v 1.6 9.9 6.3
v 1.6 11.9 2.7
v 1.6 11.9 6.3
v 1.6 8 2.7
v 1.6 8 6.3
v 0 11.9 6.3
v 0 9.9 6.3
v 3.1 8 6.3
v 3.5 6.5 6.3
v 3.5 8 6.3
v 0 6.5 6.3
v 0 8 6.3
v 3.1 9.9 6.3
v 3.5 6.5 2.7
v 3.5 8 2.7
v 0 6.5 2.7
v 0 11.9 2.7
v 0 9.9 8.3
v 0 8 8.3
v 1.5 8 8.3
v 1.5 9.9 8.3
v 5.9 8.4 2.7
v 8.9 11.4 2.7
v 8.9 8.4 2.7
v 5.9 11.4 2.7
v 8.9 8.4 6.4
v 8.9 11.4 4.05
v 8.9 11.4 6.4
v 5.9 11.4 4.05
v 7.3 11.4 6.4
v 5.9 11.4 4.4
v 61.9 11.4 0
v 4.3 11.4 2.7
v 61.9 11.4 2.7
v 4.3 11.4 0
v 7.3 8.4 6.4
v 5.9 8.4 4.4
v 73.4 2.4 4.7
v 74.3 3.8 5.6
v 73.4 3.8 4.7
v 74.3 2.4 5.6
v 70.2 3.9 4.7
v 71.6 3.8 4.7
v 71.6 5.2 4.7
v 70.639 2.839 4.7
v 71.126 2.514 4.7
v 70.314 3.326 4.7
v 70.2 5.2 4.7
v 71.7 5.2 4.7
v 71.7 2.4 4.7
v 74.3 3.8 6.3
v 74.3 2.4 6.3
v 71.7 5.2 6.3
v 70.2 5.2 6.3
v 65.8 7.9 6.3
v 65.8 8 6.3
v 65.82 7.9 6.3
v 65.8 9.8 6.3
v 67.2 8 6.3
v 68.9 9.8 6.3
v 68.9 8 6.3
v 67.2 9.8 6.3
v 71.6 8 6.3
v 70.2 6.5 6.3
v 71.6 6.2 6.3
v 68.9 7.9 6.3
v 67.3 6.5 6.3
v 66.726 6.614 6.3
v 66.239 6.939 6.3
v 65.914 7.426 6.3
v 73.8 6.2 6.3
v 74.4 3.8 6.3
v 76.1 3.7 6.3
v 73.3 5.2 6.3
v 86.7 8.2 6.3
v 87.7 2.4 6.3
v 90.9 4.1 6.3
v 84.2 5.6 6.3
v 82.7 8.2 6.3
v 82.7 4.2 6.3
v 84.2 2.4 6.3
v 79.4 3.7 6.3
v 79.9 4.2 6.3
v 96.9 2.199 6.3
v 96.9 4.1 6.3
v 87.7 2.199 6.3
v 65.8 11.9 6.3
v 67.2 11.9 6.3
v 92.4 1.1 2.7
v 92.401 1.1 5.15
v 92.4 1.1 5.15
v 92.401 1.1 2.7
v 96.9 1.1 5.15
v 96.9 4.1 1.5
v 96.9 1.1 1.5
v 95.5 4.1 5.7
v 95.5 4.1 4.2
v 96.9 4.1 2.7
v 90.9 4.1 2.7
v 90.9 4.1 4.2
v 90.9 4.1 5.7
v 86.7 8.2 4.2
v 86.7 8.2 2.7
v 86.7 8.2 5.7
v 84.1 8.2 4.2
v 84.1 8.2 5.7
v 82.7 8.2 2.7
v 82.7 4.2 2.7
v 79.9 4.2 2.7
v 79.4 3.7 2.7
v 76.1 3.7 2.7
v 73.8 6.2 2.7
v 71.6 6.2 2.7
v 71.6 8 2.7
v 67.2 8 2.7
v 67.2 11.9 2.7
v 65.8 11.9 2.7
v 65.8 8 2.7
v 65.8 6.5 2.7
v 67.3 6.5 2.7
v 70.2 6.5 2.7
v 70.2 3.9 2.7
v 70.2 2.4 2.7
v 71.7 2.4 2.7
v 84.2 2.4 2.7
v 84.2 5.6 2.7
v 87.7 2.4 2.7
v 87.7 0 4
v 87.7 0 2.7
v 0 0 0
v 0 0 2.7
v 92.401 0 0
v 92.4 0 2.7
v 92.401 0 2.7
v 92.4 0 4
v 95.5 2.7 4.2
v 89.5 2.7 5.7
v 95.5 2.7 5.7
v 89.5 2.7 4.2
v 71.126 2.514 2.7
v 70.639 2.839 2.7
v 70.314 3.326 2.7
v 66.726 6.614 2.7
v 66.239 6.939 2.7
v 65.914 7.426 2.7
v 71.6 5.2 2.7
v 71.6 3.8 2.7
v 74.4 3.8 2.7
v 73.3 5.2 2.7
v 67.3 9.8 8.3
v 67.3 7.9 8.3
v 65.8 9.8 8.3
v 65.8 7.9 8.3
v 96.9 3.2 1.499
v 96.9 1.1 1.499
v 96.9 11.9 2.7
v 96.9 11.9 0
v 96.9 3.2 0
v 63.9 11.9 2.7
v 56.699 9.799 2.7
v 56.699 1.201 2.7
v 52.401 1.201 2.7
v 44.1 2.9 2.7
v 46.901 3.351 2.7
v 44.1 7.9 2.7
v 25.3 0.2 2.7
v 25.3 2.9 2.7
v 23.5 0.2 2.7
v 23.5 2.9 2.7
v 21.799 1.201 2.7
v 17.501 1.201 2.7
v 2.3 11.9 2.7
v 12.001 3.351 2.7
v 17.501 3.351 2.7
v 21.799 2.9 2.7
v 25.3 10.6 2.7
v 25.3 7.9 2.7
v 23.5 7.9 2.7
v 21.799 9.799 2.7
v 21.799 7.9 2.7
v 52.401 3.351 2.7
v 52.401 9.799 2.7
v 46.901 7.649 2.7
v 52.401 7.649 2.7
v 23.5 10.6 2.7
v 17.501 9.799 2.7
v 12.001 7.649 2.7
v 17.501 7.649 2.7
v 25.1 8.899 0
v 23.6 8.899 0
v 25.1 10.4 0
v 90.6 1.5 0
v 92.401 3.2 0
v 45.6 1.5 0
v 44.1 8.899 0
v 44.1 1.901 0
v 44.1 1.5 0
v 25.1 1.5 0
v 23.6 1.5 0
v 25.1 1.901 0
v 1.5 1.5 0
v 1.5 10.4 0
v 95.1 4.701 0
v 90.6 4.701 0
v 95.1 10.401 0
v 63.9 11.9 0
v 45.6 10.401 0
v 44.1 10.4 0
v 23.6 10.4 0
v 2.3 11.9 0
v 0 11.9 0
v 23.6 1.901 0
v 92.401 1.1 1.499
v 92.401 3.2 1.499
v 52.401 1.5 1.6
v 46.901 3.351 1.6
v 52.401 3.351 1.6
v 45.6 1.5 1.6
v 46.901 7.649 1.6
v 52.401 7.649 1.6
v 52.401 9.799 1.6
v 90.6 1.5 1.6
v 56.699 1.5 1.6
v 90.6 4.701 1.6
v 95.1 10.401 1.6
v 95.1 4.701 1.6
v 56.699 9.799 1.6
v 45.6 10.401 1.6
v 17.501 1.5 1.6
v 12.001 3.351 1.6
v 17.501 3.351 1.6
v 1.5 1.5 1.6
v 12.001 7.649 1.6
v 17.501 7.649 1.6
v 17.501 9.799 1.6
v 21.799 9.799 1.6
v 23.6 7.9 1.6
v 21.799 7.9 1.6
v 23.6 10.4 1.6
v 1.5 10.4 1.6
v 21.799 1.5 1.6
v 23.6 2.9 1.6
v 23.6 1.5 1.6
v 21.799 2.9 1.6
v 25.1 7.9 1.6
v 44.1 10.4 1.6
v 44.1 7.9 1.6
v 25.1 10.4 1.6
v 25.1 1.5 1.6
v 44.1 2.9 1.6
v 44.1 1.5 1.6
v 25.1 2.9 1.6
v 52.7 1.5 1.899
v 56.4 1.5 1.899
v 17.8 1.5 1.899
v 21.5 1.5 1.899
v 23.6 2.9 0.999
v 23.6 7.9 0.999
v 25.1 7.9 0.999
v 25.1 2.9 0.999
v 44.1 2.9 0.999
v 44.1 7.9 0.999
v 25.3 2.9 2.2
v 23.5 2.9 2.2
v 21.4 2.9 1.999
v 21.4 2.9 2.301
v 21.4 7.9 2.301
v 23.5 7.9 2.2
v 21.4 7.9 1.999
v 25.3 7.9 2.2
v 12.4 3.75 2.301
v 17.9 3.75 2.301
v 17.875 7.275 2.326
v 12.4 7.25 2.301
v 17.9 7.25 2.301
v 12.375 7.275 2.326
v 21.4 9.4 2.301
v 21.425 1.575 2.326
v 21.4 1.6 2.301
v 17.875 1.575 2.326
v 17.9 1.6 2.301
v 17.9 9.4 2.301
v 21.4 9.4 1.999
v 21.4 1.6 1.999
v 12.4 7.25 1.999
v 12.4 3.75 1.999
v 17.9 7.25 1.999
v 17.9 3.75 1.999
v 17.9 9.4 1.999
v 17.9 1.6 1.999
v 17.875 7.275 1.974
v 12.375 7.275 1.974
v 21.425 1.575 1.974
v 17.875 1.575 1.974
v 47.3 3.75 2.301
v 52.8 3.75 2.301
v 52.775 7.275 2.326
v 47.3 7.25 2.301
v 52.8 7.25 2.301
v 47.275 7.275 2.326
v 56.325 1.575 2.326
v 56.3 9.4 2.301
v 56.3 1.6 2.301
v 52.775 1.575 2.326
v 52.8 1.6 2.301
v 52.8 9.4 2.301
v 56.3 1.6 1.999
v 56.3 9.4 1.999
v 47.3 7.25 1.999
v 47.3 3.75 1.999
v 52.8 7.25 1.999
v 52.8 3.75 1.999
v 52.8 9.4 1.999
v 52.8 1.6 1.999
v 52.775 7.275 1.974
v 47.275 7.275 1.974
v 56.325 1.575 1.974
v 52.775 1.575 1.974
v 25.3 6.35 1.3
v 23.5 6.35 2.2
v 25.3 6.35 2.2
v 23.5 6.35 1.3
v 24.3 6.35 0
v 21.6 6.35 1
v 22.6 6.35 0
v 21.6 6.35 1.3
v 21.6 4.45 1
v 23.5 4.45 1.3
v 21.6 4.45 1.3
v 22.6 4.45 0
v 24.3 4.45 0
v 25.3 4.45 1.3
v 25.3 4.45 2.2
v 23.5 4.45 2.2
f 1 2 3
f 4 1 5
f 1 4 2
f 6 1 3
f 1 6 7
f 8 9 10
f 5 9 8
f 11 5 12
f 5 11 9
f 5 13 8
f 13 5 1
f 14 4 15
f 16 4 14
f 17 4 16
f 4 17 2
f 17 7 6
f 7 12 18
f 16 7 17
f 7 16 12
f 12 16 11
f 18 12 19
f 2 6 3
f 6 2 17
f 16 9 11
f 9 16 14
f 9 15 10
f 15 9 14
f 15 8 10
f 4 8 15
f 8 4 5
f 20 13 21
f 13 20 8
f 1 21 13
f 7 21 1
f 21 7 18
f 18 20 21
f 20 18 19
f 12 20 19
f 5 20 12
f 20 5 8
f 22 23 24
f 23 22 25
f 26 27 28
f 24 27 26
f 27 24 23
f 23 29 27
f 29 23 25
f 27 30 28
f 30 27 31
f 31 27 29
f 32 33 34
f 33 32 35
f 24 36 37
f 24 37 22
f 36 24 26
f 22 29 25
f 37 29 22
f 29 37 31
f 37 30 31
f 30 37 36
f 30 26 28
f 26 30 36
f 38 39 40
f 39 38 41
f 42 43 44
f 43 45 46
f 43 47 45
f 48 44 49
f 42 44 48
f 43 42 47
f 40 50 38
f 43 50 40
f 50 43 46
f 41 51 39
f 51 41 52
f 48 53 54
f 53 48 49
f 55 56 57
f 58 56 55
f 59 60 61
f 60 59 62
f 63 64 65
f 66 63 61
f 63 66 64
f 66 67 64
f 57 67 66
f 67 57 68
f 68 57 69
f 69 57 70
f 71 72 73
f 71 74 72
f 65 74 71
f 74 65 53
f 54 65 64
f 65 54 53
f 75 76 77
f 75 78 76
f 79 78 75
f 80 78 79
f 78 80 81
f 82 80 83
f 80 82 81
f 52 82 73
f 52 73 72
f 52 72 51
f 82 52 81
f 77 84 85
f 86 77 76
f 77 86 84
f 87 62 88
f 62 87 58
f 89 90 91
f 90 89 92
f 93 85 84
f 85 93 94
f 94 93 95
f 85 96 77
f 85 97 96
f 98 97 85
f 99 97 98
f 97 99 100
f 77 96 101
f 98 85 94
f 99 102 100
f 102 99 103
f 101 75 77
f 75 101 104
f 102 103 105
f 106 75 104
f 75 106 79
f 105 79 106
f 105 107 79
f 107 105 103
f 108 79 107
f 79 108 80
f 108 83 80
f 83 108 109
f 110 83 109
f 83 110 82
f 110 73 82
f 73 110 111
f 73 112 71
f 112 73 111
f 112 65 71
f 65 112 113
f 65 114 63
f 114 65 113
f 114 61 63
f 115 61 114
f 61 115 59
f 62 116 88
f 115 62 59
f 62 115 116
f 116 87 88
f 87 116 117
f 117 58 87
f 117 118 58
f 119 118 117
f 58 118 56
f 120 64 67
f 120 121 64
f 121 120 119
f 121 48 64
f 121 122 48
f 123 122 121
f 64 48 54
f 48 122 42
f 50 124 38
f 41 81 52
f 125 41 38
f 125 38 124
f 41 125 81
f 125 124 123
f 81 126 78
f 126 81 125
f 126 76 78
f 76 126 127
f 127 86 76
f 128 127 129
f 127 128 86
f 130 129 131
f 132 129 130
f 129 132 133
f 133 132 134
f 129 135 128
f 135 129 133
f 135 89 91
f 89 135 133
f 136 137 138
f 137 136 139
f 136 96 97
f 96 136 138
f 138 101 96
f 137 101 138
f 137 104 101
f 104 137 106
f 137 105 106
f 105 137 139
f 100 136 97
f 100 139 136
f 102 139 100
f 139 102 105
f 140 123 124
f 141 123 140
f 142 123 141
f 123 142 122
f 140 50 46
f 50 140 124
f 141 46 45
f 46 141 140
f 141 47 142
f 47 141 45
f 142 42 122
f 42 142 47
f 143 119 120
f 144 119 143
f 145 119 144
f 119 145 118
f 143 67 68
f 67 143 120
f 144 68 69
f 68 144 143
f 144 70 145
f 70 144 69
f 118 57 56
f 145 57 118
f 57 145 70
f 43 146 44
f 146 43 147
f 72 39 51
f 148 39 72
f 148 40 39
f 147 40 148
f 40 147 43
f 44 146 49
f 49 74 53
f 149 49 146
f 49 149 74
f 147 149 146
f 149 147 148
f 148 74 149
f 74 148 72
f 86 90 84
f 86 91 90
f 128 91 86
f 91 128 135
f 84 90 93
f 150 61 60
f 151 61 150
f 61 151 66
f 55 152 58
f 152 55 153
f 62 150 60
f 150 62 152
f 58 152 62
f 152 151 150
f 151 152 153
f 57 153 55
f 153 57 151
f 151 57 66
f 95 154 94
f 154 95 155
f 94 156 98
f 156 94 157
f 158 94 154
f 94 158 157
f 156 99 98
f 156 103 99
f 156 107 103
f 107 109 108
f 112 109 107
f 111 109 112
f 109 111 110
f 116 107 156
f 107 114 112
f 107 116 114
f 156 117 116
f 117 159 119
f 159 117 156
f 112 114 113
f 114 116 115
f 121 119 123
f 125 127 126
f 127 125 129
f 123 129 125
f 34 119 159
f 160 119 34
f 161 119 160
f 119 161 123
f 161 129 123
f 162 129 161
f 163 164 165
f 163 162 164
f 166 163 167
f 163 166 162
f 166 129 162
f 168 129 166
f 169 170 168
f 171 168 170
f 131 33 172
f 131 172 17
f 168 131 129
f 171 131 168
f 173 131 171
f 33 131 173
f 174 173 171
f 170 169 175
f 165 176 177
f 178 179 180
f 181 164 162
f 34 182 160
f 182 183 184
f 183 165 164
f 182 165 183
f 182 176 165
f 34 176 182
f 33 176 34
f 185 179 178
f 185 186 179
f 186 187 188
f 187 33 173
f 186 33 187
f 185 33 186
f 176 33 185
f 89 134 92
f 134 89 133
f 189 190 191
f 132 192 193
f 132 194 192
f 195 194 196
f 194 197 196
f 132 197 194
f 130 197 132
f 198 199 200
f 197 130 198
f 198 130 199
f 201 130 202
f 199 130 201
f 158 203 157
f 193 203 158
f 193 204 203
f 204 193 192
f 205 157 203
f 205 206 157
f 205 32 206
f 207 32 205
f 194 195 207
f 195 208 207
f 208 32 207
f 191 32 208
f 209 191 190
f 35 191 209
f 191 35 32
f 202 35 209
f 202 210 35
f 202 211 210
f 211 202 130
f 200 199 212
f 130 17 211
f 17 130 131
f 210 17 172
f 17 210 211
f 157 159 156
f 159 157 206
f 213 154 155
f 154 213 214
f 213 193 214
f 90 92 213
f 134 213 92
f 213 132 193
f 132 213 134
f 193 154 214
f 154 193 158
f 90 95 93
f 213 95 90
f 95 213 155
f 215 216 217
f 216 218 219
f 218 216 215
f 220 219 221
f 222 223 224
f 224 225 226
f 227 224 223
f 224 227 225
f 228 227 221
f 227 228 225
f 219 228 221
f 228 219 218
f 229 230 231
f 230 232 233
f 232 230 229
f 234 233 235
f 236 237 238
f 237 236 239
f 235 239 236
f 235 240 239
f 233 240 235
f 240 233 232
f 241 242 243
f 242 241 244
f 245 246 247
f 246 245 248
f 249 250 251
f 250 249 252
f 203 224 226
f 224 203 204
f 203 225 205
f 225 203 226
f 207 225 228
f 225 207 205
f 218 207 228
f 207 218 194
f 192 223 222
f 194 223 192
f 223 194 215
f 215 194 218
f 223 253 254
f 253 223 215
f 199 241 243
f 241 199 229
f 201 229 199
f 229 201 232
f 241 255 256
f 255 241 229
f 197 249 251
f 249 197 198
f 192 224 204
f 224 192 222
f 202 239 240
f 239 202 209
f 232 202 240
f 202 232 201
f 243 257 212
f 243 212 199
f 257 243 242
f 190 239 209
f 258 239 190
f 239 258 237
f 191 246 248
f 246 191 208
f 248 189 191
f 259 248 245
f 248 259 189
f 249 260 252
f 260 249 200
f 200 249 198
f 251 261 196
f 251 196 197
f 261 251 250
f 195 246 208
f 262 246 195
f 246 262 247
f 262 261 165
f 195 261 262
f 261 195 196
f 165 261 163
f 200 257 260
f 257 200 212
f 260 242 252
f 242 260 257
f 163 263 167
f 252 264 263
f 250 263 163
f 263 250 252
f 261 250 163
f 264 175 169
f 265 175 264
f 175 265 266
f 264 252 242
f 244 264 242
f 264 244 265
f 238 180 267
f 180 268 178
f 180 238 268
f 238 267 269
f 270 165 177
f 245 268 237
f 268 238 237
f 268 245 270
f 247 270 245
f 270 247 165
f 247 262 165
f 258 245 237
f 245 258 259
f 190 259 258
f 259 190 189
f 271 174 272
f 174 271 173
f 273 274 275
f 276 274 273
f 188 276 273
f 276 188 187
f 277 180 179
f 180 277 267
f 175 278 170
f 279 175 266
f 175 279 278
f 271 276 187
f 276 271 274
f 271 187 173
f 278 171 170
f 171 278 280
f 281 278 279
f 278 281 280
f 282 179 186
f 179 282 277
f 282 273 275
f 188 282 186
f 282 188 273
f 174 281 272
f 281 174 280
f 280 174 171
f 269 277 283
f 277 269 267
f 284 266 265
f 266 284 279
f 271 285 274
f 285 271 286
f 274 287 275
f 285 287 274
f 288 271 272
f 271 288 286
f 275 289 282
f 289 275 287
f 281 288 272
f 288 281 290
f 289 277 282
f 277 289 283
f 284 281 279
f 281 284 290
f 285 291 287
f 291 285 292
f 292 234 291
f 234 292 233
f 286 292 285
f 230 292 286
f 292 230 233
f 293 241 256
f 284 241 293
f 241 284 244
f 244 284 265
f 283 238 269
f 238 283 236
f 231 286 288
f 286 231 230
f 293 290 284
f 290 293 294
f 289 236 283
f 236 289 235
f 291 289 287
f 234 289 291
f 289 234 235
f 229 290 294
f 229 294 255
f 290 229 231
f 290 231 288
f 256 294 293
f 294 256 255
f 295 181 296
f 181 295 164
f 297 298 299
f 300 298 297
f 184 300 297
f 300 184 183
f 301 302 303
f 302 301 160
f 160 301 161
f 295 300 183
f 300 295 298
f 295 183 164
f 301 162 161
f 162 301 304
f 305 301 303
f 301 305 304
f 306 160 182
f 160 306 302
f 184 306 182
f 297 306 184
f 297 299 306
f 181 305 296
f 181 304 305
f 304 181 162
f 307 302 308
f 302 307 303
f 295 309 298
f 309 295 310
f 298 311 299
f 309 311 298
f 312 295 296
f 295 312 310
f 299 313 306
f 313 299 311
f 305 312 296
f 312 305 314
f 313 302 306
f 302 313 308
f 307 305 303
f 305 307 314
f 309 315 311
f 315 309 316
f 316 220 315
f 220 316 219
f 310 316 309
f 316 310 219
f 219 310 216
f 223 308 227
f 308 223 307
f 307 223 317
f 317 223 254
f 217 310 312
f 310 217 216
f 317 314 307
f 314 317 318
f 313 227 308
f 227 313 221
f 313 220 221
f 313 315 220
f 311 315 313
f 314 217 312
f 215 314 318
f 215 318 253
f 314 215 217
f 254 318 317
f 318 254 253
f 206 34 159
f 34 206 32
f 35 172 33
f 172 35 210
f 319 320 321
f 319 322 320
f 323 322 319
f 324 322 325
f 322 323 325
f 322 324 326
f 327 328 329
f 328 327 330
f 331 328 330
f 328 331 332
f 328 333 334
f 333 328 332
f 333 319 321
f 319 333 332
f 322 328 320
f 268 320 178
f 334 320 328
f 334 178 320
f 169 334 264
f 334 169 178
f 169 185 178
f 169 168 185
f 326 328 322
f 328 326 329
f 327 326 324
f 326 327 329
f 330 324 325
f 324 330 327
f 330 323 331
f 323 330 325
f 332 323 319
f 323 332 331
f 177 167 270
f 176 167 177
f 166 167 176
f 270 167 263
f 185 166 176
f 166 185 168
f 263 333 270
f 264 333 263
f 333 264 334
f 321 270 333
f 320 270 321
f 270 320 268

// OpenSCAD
$fn=16;

HACK=0.001;

body = [ 96.9, 11.9, 2.7 ];

wall = 1.5;
hollow_depth = 1.6;

end_corner_notch = [ 4.5, 3.2+HACK, 1.5];
half_end_corner_notch = [ 4.5, 1.1+HACK, 3*body[2]];
t_hole_chamfer = 0.4;

slide_cut_h = 5;
upper_notch_h = 0.5;

module chamfer_cuboid(w, h, chamfer) {
  scale = [ (w-2*chamfer)/w,
            (h-2*chamfer)/h
          ];
  
  translate([w/2, h/2])
  linear_extrude(chamfer, scale=scale) {
    square([w,h], center=true);
    
  }
}


// Origin is Bottom-right, on the top surface (hanging below the X/Y plane)
// T-shaped hole with chamfers on both openings
module t_hole(depth) {
  chamfer=t_hole_chamfer;
  w=9;
  h=7.8;
  t=3.5;
  d=depth - 2*chamfer;    // Depth of the straight portion
  
  cw = w + 2*chamfer;
  ch = h + 2*chamfer;
  ct = t + 2*chamfer;

  // Extended above the top of the upper surface
  translate([-chamfer, -chamfer, HACK]) {
    translate([0, (ch-ct)/2]) {
      //cube([cw,ct,depth+HACK]);
      mirror([0,0,1])
        chamfer_cuboid(cw,ct, chamfer);
    }
    translate([(cw-ct), 0]) {
      //cube([ct,ch,depth+HACK]);
      mirror([0,0,1])
        chamfer_cuboid(ct,ch, chamfer);
    }
  }
  
  // FIXME: Chamfer these holes
  
  // Straight bit of the hole
  translate([0, 0, -depth+HACK]) {
    translate([0, (h-t)/2])
      cube([w,t,depth]);
    translate([(w-t), 0])
      cube([t,h,depth]);
  }
  
  // Extended below the bottom surface
  translate([-chamfer, -chamfer,-depth-HACK]) {
    translate([0, (ch-ct)/2]) {
      //cube([cw,ct,depth+HACK]);
      chamfer_cuboid(cw,ct, chamfer);
    }
    translate([(cw-ct), 0]) {
      //cube([ct,ch,depth+HACK]);
      chamfer_cuboid(ct,ch, chamfer);
    }
  }

}

// The long rectangular cut, including the chamfers of the little vertical wall
// Origin is the far-bottom (+x, -y) corner of the rectangular hole
// Z-aligned with the top surface of the body
module slide_cut() {
  
  chamfer = 1;
  h = slide_cut_h;
  l = 25;
  d = body[2] + 1 - chamfer;
  
  // Extend one extra mm past top surface
  translate([0,0,1])
  rotate([90, 0, -90])
  linear_extrude(l) {
    polygon(
      [
        [ 0, 0],
        [ -h, 0],
        [ -h, -d],
        [ -(h+chamfer), -(d+chamfer) ],
        [ -(h+chamfer), -(d+3*chamfer) ],  // Extend cut below
    
        [ (chamfer), -(d+3*chamfer) ],  // Extend cut below
        [ (chamfer), -(d+chamfer) ],
        [ 0, -d],
      ]
    );
  }
}

module spring_hook() {
  chamfer = 1;
  top = 1.7;
  neck_w = 1.8;
  tip = 0.3;
  
  width = chamfer + top + chamfer;
  height = 1.9;
  depth = 2.2;
  
  bar_depth = body[2] - depth;
  
  // The little hook that hangs under the bar
  translate([0,0,-bar_depth])
  rotate([90, 0, 0])
  linear_extrude(height, center=true)
    polygon(
      [
        [ 0, HACK ],
        [ neck_w, HACK],
        [ neck_w, -(height - chamfer)],
        [ neck_w - chamfer, -depth ],
        [ neck_w - chamfer - top, -depth],
        [ neck_w - chamfer - top - chamfer, -(depth - chamfer)],
        [ neck_w - chamfer - top - chamfer, -(depth - chamfer - tip)],
        [ 0, -(depth- chamfer - tip)],
      ]
    );
    
    // The vertical bar the hook sits on
    translate([neck_w/2, 0, -bar_depth/2])
    cube([neck_w, body[1] - wall, bar_depth], center=true);
}


module latch_tip() {
  mirror([0,1,0])
  rotate([90, 0, 0])
  linear_extrude(1.9)
  polygon(
    [
      [ 0,0 ],
      [ 0, 2 ],
      [ 1.5, 2],
      [ 3.1, 0 ]
    ]
  );
}
  
module front_latch() {
  d = 3.6;
  h = 5.4;
  
  translate([0,-h, 0])
  union() {
    
    // L-shaped bit on the left
    cube([1.6, h, d]);
    cube([3.5, 1.5, d]);
    
    // Latch on top of the L-shaped bit
    translate([0, 1.5, d])
      latch_tip();
    
    // Latchy thing to the right
    translate([8.9, h - upper_notch_h, 0])
    rotate([90, 0, 0])
    linear_extrude(3) {
      polygon([
        [ -3,0 ],
        [ 0,0 ],
        [ 0, 3.7 ],
        [ -1.6, 3.7 ],
        [ -3, 1.7 ]
      ]);
    }
  }
}

module br_fillet(r) {
  translate([r, r])
  difference() {
    translate([-(r+HACK), -(r+HACK)])
      square(r+HACK, center=false);
    
    circle(r=r, center=true);
  }
}

module rear_latch() {
  d = 3.6;
  rounding = 1.5;
  extra_depth = body[2] - 1.5;
  difference() {
    translate([0,0,-extra_depth])
    linear_extrude(d+extra_depth) {
      polygon([
        // Lower (outside) edge of contour
        [ 0, 1.1 ],
        [ -end_corner_notch[0], 1.1 ],
        [ -end_corner_notch[0], 0 ],
        [ -9.2, 0 ],
        [ -9.2, 2.4 ],
        [ -12.7, 5.6 ],
        [ -12.7, 2.4 ],
        [ -26.7, 2.4 ],   // Rounded
        [ -26.7, 6.5 ],
        [ -31.1, 6.5 ],     // Rounded
        [ -31.1, body[1] ], // Top-left corner
      
        // Inside edge (upper)
        [ -29.7, body[1] ],
        [ -29.7, body[1] - 3.9 ],
        [ -25.3, body[1] - 3.9 ],
        [ -25.3, body[1] - 5.7 ],
        [ -(25.3-2.2), body[1] - 5.7 ],
        [ -20.8, body[1] - 8.2 ],
        [ -17.5, body[1] - 8.2 ],
        [ -17, body[1] - 7.7 ],
        [ -14.2, body[1] - 7.7 ],
        [ -14.2, body[1] - 3.7 ],
        [ -10.2, body[1] - 3.7 ],
        [ -6, 4.1 ],
        [ 0, 4.1 ],
      
      ]);
    }
    
    // Groove into sloped part
    translate([0, 0, 1.5])
      linear_extrude(1.5) {
        polygon([
            [ -1.4, 2.7 ],
            [ -7.4, 2.7 ],
            [ -12.8, body[1] - 3.7 ],
            [ -12.8, body[1] ],
            [ -1.4, body[1]],
        ]);
      }
    
    // Fillet of rounded corners
    translate([-26.7, 2.4])
      linear_extrude(d+HACK) br_fillet(rounding);
    translate([-31.1, 6.5])
      linear_extrude(d+HACK) br_fillet(rounding);
    
    
    // Cuts around the lowered rounded corner
    translate([-26.7, 2.4, 2.0]) {
      rotate([90,0,0])
        translate([0,0,-1.5])
        linear_extrude(1.5+HACK)
          polygon([
            [0, 0],
            [3.2, 0],
            [4.1, 0.9],
            [4.1, 2],
            [0, 2]
          ]);
        translate([-HACK, 0, 0])
          cube([1.5+HACK, 2.8, d]);
    }
          
     // Hole down into the rounded corner
     linear_extrude(d+HACK) {
        polygon([
          [-25.3, 3.8],
          [-25.3, 5.2],
          [-23.6, 5.2],
          [-22.5, 3.8],
        ]);
     }
     
     // Wide chamfer near the right end
     rotate([0, -90, 0])
     linear_extrude(9.5) {
      polygon([
          [1.3, 0],
          [3.6+HACK, 2.2],
          [3.6+HACK, 0]
       
       ]);
     }
     
  }
  
  translate([-31.1, 7.9, d])
    latch_tip();
}

module main_body () {
  
              
  hollow_h = body[1]-2*wall; 
  hollow_1 = 22.1;
  hollow_2 = 19;
  hollow_3 = 45;
  hollow_4 = [ hollow_3 + end_corner_notch[0],
               5.7 ];
  
  slide_cut_y = 2.9;
    
  difference() {
    union() {
      cube(body);
               
    translate([0, body[1], body[2]])
      front_latch();
        
      translate([body[0], 0, body[2]])
        rear_latch();
    }
  
    // Corner notch
    translate([body[0] - end_corner_notch[0]+HACK, -HACK, -HACK]) {
      cube(end_corner_notch);
      cube(half_end_corner_notch);
    }
    
    // Smaller part of the corner notch
       
    // Hollowing on the underside  
    translate([0,0,-HACK]) {

      linear_extrude(hollow_depth+HACK) {

        translate([wall, wall])
          square([hollow_1, hollow_h]);
        
        translate([2*wall + hollow_1, wall,])
          square([hollow_2, hollow_h]);
        
        translate([3*wall + hollow_1 + hollow_2, wall])  {
          square([hollow_3, hollow_h]);
          
          // The extra bit that sticks out under the corner notch
          translate([0,end_corner_notch[1]])
            square(hollow_4);
        }
      }
      
      // Long rectangular hole that cuts into the left T
      translate([2*wall + hollow_1 + hollow_2, slide_cut_y, body[2]])
        slide_cut();
    }    
    
    // Long upper edge notch
    translate([2.3, body[1]])
    linear_extrude(3*body[2], center=true) {
      notch_chamfer_w = 2;
      notch_w = 61.6;
      notch_h = upper_notch_h;
      polygon([ [ 0, HACK ],
                [ 0, 0],
                [ notch_chamfer_w, -notch_h ],
                [ notch_w - notch_chamfer_w, -notch_h ],
                [ notch_w, 0 ],
                [ notch_w, HACK]
              ]);
    }

    
    // T-shaped holes through the body    
    translate([0, 1.6, body[2]]) {

      translate([12.4, 0, 0])
        t_hole(body[2] - hollow_depth);
      
      translate([47.3, 0, 0])
        t_hole(body[2] - hollow_depth);
    }
  }
  
  // Fix-up for chamfers in T-holes on the underside
  cube([body[0]-end_corner_notch[0], wall, body[2]-t_hole_chamfer]);
          
        
  // Hook for spring, inside the long rectangular hole
  translate([wall + hollow_1 - 0.1, slide_cut_y + (slide_cut_h/2), body[2]])
    spring_hook();



}







module eject_slider() {
  main_body();
  
}


eject_slider();
